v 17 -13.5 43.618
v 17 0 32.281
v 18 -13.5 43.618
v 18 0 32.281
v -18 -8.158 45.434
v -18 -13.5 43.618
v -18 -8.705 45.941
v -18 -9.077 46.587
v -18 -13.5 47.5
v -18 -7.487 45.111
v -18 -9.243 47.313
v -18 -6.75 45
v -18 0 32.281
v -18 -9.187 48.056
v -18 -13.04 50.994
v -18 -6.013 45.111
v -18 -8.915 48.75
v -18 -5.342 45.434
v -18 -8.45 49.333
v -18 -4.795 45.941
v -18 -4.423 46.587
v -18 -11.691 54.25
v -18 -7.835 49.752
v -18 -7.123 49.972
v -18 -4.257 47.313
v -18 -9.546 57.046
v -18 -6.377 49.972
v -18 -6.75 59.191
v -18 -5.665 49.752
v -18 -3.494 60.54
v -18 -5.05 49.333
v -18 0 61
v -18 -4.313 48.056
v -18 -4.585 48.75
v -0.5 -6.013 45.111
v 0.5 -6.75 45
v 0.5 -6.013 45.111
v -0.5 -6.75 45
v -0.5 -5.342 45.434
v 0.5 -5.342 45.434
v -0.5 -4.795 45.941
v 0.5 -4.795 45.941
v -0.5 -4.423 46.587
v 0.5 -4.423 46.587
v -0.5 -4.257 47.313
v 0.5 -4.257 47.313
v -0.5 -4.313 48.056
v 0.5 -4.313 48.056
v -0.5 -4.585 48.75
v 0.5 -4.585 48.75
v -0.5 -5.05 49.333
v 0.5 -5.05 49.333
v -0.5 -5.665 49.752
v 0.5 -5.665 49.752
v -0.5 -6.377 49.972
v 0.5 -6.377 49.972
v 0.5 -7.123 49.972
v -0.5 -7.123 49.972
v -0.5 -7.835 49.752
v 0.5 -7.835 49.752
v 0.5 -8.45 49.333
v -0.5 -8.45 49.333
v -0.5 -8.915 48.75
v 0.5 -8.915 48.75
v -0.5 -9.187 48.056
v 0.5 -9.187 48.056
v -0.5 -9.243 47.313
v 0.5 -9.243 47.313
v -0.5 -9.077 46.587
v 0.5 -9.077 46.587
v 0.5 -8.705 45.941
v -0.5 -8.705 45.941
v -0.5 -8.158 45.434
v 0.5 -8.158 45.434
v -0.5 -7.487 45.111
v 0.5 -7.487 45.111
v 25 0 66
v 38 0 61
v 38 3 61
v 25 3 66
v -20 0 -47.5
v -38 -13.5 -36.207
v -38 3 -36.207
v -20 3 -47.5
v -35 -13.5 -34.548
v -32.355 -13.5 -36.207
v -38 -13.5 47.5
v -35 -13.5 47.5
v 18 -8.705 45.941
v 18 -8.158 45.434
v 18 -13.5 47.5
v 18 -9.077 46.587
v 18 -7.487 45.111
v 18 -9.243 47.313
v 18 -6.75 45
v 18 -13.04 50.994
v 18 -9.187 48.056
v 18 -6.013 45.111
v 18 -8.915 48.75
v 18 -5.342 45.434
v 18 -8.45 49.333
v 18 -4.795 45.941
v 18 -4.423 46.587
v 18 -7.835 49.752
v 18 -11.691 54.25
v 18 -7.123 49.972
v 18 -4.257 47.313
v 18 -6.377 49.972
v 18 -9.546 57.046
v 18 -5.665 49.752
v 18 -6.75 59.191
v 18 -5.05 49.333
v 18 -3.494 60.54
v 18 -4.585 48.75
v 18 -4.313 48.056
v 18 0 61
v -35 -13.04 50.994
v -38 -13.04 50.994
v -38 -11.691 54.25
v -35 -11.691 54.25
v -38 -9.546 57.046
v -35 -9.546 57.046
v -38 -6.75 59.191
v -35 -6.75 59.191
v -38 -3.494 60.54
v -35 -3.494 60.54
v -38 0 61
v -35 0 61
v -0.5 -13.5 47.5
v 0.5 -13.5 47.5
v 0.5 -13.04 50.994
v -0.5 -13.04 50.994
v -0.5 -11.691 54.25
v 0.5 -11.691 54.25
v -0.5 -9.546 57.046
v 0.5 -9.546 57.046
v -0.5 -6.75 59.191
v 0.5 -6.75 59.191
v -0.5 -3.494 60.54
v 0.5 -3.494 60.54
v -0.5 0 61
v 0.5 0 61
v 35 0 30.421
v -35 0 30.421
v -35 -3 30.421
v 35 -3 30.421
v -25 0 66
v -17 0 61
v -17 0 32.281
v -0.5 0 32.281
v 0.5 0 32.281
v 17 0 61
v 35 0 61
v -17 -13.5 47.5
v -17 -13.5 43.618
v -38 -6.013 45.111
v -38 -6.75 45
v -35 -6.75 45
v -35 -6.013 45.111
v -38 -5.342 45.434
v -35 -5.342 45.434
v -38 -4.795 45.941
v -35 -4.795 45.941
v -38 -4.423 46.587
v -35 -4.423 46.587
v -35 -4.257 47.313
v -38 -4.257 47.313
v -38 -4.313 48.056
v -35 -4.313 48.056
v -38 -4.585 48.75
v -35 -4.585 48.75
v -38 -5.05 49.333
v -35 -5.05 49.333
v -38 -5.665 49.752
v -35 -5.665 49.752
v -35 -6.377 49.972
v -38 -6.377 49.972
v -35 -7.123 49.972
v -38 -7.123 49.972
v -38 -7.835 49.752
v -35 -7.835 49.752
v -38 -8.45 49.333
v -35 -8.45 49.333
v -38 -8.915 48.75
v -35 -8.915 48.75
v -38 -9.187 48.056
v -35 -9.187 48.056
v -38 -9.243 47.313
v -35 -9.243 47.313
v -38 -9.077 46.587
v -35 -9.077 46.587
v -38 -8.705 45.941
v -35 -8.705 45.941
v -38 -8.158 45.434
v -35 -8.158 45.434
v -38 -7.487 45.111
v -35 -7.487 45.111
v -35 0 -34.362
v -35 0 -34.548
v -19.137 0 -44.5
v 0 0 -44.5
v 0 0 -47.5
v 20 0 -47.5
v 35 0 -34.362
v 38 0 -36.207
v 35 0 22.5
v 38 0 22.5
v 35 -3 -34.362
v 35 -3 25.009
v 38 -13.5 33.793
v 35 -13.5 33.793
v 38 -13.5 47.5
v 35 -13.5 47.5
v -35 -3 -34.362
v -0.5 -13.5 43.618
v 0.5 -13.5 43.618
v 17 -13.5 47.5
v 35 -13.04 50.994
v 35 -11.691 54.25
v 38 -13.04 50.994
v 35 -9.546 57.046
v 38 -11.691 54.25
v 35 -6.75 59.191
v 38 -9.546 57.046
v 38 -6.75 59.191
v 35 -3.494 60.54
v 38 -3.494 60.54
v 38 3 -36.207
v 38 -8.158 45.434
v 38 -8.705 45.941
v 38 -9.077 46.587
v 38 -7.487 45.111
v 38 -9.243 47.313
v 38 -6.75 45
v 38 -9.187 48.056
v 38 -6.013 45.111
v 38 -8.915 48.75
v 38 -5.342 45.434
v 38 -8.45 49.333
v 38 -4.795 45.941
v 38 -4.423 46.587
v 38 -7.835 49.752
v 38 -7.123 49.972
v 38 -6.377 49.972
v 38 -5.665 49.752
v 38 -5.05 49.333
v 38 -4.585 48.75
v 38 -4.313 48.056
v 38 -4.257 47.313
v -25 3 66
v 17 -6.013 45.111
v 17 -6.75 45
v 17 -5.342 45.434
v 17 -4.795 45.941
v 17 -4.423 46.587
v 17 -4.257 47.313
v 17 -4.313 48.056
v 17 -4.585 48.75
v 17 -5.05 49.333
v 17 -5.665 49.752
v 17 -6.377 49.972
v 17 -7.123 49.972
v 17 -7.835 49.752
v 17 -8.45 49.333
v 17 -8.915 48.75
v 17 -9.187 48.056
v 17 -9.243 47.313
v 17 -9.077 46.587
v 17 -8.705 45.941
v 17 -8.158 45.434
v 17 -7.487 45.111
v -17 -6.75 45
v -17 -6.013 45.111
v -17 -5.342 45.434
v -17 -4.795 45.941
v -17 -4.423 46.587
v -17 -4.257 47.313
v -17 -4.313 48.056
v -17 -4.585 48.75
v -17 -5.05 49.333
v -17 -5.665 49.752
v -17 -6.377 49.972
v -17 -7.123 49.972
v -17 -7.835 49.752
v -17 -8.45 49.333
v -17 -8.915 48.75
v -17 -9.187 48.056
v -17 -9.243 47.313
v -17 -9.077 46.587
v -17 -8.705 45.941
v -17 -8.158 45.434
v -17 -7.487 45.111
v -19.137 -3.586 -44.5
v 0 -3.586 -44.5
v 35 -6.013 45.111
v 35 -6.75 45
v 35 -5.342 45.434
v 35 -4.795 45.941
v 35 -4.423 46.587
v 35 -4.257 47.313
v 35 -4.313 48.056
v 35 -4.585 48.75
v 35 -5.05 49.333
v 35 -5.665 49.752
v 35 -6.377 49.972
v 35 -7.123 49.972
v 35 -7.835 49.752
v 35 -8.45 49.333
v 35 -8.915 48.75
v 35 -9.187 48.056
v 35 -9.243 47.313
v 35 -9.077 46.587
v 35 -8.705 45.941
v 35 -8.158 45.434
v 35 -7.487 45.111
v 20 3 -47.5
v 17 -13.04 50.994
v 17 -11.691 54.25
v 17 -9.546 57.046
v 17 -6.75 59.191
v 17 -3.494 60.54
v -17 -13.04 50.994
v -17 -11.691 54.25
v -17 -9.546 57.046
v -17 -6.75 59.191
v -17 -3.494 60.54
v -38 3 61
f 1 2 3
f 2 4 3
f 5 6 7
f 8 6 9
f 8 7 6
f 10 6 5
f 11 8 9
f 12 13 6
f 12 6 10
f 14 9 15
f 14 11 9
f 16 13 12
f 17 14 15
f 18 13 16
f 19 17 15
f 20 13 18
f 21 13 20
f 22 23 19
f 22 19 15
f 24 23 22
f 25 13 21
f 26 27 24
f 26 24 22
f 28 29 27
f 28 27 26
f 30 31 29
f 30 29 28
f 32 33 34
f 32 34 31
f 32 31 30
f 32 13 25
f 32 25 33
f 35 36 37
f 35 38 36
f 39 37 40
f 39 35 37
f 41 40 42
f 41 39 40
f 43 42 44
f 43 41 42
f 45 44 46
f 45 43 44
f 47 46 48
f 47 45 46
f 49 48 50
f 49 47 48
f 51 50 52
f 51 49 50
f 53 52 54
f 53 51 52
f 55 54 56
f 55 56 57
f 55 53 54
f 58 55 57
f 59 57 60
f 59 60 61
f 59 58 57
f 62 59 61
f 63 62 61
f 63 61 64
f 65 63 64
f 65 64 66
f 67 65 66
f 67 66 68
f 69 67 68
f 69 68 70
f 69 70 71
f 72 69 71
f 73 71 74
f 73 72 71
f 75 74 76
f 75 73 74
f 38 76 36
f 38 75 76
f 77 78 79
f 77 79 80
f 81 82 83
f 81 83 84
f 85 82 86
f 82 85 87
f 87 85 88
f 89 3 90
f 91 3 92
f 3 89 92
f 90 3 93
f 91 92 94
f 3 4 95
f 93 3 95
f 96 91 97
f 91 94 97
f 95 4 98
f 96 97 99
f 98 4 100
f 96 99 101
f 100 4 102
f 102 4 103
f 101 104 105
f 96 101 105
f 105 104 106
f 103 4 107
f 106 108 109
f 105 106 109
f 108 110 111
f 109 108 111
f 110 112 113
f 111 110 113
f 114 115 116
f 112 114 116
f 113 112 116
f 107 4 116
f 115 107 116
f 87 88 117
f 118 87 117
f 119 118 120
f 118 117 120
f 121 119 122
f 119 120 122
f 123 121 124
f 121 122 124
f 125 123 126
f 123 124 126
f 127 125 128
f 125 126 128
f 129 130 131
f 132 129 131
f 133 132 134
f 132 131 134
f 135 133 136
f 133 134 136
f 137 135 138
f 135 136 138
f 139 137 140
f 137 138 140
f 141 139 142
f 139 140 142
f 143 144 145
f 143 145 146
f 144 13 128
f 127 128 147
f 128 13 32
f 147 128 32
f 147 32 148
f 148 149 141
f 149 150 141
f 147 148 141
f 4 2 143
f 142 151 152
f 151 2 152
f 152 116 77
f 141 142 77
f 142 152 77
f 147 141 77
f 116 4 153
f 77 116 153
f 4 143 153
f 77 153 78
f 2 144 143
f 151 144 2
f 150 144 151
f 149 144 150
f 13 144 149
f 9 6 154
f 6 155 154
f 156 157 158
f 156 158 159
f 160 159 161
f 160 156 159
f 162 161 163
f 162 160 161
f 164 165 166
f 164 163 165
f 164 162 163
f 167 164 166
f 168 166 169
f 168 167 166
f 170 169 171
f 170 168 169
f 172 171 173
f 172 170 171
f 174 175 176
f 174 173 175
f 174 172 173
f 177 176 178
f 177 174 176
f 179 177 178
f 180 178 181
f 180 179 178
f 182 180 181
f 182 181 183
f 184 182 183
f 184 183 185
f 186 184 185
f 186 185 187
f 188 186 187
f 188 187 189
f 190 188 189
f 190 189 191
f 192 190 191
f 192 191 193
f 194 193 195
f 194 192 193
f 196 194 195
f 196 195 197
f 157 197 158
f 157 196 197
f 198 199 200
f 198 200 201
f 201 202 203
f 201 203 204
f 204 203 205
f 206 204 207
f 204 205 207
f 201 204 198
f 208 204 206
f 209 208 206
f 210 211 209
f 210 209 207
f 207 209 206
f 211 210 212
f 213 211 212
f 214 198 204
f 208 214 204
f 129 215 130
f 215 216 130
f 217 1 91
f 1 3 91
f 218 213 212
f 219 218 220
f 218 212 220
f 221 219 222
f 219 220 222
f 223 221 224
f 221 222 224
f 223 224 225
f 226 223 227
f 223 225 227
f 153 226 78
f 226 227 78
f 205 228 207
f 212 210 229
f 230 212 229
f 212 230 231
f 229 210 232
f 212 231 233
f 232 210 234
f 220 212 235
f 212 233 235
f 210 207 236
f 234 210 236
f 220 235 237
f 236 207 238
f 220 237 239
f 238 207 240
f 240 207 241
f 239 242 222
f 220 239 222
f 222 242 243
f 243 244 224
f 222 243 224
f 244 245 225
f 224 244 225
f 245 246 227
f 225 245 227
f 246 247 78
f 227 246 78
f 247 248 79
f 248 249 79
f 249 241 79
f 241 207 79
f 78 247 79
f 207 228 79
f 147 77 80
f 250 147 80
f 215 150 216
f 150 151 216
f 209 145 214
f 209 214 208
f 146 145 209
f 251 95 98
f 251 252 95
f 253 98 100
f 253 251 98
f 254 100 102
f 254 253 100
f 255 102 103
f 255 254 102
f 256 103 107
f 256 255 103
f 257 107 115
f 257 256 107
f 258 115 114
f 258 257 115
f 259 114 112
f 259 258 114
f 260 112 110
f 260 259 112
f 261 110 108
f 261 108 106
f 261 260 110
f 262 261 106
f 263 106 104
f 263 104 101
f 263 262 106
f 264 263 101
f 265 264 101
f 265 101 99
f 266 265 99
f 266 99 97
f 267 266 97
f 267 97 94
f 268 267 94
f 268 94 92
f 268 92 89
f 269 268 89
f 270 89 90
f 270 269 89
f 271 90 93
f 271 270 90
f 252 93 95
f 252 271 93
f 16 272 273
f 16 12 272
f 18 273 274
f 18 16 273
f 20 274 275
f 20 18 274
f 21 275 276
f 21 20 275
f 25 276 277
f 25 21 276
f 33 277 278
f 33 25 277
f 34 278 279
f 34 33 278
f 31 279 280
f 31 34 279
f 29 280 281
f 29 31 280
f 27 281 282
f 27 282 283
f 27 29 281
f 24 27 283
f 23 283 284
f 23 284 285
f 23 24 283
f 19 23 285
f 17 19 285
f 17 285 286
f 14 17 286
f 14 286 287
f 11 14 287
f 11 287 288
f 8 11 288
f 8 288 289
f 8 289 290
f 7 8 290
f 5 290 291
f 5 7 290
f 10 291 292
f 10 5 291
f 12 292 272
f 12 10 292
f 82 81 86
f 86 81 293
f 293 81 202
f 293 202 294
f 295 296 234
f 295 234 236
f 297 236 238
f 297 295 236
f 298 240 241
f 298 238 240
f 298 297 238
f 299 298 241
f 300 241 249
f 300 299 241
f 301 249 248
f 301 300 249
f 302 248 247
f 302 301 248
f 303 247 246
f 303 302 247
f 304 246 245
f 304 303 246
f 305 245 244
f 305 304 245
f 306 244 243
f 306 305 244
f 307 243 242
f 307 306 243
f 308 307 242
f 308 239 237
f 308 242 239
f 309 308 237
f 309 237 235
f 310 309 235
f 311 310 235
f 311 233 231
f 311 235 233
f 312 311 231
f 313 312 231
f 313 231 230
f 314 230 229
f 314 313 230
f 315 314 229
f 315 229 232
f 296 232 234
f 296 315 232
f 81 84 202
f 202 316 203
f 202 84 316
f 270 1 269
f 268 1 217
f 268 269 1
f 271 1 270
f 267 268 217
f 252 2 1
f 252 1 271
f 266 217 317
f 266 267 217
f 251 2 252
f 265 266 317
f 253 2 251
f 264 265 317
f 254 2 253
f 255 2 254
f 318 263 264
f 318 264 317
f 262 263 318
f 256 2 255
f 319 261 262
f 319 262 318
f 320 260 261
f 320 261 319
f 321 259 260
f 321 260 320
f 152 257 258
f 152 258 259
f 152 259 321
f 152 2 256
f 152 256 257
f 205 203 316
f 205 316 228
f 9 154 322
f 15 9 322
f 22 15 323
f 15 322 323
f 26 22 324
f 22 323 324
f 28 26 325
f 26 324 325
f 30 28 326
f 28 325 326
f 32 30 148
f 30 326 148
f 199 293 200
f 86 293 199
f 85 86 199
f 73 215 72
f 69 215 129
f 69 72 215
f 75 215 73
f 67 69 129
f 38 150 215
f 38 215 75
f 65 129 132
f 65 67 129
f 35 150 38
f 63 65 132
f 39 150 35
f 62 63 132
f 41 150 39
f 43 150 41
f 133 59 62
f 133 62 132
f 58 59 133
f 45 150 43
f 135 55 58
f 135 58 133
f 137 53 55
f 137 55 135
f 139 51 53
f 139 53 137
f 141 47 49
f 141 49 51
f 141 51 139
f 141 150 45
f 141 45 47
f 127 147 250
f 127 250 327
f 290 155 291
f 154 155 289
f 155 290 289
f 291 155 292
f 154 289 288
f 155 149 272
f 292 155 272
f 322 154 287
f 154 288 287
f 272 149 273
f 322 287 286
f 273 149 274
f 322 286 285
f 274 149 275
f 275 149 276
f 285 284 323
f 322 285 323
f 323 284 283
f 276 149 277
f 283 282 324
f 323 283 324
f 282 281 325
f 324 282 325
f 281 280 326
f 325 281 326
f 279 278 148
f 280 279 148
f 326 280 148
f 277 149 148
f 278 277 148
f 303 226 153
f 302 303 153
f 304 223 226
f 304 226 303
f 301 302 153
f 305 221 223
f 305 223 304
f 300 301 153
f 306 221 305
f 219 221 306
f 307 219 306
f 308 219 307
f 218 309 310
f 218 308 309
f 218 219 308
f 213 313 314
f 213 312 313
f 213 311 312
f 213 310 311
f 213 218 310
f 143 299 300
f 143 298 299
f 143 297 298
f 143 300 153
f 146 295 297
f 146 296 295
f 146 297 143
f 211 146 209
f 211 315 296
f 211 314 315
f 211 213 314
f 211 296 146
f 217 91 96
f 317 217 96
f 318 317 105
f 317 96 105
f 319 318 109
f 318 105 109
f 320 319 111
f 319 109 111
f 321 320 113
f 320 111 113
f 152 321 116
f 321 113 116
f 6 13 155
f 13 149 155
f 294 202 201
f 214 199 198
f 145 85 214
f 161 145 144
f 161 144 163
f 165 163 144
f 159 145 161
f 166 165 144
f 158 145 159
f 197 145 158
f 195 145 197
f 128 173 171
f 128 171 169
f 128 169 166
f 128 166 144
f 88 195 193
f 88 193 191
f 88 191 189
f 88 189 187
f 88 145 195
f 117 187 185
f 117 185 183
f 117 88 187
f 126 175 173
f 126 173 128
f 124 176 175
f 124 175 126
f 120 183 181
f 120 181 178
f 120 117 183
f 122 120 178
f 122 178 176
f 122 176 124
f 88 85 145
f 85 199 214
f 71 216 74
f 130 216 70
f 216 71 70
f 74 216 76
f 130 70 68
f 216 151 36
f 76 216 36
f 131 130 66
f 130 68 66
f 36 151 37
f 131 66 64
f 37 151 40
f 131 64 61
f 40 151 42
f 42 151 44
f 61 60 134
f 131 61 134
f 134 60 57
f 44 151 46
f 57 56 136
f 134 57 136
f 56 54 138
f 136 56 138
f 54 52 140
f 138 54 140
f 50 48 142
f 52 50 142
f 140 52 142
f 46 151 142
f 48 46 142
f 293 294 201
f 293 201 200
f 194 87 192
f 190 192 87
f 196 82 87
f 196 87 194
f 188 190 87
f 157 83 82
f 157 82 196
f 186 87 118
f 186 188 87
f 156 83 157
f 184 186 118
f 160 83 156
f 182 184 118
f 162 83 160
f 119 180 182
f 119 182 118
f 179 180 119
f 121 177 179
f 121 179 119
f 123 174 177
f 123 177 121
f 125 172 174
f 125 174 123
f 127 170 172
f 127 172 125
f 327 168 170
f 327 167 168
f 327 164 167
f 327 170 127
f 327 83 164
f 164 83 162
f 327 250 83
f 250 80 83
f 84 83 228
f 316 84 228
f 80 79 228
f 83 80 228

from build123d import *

# Parameters (mm, degrees)
BOSS_EXTRUDE1_DEPTH     = 38
CUT_EXTRUDE1_DEPTH      = 78.345006303
CUT_EXTRUDE1_DEPTH_BACK = 78.345006303
SKETCH2_OUTSIDE_W       = 105.518
SKETCH2_OUTSIDE_H       = 143.018
SHELL1_START            = -13.5
SHELL1_DEPTH            = 13.5
CUT_EXTRUDE2_DEPTH      = 78.345006303
CUT_EXTRUDE2_DEPTH_BACK = 78.345006303
SKETCH3_R               = 2.5
CUT_EXTRUDE3_DEPTH      = 38
SKETCH5_R               = 2.5
BOSS_EXTRUDE2_DEPTH     = 0.5
LPATTERN1_COUNT         = 3
LPATTERN1_PITCH         = 17.5
SKETCH7_W               = 70
SKETCH7_H               = 64.783051232
BOSS_EXTRUDE3_DEPTH     = 3


# Read off the part's stored shape, not the designer's step: Shell1
with BuildPart() as part:
    # Sketch1 → Boss-Extrude1 (new, symmetric)
    with BuildSketch(Plane(origin=(0, 0, 0), x_dir=(0, 0, -1), z_dir=(1, 0, 0))):
        with BuildLine():
            Line((-61, 0), (-66, 0))
            Line((-66, 0), (-66, 3))
            Line((-66, 3), (47.5, 3))
            Line((47.5, 3), (47.5, 0))
            Line((47.5, 0), (36.207291717, -13.5))
            Line((36.207291717, -13.5), (-47.5, -13.5))
            ThreePointArc((-47.5, -13.5), (-57.045941546, -9.545941546), (-61, 0))
        make_face()
    extrude(amount=BOSS_EXTRUDE1_DEPTH, both=True)

    # Sketch2 outside → Cut-Extrude1 (cut, two sides: drawn at the far end of the back side and taken through both)
    with BuildSketch(Plane(origin=(0, 0, 0), x_dir=(1, 0, 0), z_dir=(0, 1, 0)).offset(-CUT_EXTRUDE1_DEPTH_BACK)):
        with Locations((0, -9.25)):
            Rectangle(SKETCH2_OUTSIDE_W, SKETCH2_OUTSIDE_H)
        Polygon((-25, -66), (-38, -61), (-38, 36.207291717), (-20, 47.5), (20, 47.5), (38, 36.207291717), (38, -61), (25, -66), align=None, mode=Mode.SUBTRACT)
    extrude(amount=CUT_EXTRUDE1_DEPTH + CUT_EXTRUDE1_DEPTH_BACK, mode=Mode.SUBTRACT)

    # Shell1 outline → Shell1 (cut)
    with BuildSketch(Plane(origin=(0, 0, 0), x_dir=(1, 0, 0), z_dir=(0, 1, 0)).offset(SHELL1_START)):
        Polygon((19.136843791, 44.5), (-19.136843791, 44.5), (-35, 34.547889139), (-35, -68), (35, -68), (35, 34.547889139), align=None)
    extrude(amount=SHELL1_DEPTH, mode=Mode.SUBTRACT)

    # Sketch3 → Cut-Extrude2 (cut, two sides: drawn at the far end of the back side and taken through both)
    with BuildSketch(Plane(origin=(0, 0, 0), x_dir=(0, 0, -1), z_dir=(1, 0, 0)).offset(-CUT_EXTRUDE2_DEPTH_BACK)):
        with Locations((-47.5, -6.75)):
            Circle(SKETCH3_R)
    extrude(amount=CUT_EXTRUDE2_DEPTH + CUT_EXTRUDE2_DEPTH_BACK, mode=Mode.SUBTRACT)

    # Sketch4 → Cut-Extrude3 (cut)
    with BuildSketch(Plane(origin=(0, 0, 0), x_dir=(0, 0, -1), z_dir=(1, 0, 0))):
        Polygon((-22.5, 0), (47.5, 0), (36.207291717, -13.5), (-33.792708283, -13.5), align=None)
    extrude(amount=CUT_EXTRUDE3_DEPTH, mode=Mode.SUBTRACT)

    # Sketch5 → Boss-Extrude2 (add, symmetric)
    with BuildSketch(Plane(origin=(17.5, 0, 0), x_dir=(0, 0, -1), z_dir=(1, 0, 0))):
        with BuildLine():
            Line((-61, 0), (-32.281378795, 0))
            Line((-32.281378795, 0), (-43.618023888, -13.5))
            Line((-43.618023888, -13.5), (-47.5, -13.5))
            ThreePointArc((-47.5, -13.5), (-57.045941546, -9.545941546), (-61, 0))
        make_face()
        with Locations((-47.5, -6.75)):
            Circle(SKETCH5_R, mode=Mode.SUBTRACT)
    boss_extrude2 = extrude(amount=BOSS_EXTRUDE2_DEPTH, both=True)

    # LPattern1: Boss-Extrude2 ×3
    with Locations(*[(-i * LPATTERN1_PITCH, 0, 0) for i in range(1, LPATTERN1_COUNT)]):
        add(boss_extrude2)

    # Sketch7 → Boss-Extrude3 (add)
    with BuildSketch(Plane.XZ):
        with Locations((0, -1.970822706)):
            Rectangle(SKETCH7_W, SKETCH7_H)
    extrude(amount=BOSS_EXTRUDE3_DEPTH)


solid = part.part
